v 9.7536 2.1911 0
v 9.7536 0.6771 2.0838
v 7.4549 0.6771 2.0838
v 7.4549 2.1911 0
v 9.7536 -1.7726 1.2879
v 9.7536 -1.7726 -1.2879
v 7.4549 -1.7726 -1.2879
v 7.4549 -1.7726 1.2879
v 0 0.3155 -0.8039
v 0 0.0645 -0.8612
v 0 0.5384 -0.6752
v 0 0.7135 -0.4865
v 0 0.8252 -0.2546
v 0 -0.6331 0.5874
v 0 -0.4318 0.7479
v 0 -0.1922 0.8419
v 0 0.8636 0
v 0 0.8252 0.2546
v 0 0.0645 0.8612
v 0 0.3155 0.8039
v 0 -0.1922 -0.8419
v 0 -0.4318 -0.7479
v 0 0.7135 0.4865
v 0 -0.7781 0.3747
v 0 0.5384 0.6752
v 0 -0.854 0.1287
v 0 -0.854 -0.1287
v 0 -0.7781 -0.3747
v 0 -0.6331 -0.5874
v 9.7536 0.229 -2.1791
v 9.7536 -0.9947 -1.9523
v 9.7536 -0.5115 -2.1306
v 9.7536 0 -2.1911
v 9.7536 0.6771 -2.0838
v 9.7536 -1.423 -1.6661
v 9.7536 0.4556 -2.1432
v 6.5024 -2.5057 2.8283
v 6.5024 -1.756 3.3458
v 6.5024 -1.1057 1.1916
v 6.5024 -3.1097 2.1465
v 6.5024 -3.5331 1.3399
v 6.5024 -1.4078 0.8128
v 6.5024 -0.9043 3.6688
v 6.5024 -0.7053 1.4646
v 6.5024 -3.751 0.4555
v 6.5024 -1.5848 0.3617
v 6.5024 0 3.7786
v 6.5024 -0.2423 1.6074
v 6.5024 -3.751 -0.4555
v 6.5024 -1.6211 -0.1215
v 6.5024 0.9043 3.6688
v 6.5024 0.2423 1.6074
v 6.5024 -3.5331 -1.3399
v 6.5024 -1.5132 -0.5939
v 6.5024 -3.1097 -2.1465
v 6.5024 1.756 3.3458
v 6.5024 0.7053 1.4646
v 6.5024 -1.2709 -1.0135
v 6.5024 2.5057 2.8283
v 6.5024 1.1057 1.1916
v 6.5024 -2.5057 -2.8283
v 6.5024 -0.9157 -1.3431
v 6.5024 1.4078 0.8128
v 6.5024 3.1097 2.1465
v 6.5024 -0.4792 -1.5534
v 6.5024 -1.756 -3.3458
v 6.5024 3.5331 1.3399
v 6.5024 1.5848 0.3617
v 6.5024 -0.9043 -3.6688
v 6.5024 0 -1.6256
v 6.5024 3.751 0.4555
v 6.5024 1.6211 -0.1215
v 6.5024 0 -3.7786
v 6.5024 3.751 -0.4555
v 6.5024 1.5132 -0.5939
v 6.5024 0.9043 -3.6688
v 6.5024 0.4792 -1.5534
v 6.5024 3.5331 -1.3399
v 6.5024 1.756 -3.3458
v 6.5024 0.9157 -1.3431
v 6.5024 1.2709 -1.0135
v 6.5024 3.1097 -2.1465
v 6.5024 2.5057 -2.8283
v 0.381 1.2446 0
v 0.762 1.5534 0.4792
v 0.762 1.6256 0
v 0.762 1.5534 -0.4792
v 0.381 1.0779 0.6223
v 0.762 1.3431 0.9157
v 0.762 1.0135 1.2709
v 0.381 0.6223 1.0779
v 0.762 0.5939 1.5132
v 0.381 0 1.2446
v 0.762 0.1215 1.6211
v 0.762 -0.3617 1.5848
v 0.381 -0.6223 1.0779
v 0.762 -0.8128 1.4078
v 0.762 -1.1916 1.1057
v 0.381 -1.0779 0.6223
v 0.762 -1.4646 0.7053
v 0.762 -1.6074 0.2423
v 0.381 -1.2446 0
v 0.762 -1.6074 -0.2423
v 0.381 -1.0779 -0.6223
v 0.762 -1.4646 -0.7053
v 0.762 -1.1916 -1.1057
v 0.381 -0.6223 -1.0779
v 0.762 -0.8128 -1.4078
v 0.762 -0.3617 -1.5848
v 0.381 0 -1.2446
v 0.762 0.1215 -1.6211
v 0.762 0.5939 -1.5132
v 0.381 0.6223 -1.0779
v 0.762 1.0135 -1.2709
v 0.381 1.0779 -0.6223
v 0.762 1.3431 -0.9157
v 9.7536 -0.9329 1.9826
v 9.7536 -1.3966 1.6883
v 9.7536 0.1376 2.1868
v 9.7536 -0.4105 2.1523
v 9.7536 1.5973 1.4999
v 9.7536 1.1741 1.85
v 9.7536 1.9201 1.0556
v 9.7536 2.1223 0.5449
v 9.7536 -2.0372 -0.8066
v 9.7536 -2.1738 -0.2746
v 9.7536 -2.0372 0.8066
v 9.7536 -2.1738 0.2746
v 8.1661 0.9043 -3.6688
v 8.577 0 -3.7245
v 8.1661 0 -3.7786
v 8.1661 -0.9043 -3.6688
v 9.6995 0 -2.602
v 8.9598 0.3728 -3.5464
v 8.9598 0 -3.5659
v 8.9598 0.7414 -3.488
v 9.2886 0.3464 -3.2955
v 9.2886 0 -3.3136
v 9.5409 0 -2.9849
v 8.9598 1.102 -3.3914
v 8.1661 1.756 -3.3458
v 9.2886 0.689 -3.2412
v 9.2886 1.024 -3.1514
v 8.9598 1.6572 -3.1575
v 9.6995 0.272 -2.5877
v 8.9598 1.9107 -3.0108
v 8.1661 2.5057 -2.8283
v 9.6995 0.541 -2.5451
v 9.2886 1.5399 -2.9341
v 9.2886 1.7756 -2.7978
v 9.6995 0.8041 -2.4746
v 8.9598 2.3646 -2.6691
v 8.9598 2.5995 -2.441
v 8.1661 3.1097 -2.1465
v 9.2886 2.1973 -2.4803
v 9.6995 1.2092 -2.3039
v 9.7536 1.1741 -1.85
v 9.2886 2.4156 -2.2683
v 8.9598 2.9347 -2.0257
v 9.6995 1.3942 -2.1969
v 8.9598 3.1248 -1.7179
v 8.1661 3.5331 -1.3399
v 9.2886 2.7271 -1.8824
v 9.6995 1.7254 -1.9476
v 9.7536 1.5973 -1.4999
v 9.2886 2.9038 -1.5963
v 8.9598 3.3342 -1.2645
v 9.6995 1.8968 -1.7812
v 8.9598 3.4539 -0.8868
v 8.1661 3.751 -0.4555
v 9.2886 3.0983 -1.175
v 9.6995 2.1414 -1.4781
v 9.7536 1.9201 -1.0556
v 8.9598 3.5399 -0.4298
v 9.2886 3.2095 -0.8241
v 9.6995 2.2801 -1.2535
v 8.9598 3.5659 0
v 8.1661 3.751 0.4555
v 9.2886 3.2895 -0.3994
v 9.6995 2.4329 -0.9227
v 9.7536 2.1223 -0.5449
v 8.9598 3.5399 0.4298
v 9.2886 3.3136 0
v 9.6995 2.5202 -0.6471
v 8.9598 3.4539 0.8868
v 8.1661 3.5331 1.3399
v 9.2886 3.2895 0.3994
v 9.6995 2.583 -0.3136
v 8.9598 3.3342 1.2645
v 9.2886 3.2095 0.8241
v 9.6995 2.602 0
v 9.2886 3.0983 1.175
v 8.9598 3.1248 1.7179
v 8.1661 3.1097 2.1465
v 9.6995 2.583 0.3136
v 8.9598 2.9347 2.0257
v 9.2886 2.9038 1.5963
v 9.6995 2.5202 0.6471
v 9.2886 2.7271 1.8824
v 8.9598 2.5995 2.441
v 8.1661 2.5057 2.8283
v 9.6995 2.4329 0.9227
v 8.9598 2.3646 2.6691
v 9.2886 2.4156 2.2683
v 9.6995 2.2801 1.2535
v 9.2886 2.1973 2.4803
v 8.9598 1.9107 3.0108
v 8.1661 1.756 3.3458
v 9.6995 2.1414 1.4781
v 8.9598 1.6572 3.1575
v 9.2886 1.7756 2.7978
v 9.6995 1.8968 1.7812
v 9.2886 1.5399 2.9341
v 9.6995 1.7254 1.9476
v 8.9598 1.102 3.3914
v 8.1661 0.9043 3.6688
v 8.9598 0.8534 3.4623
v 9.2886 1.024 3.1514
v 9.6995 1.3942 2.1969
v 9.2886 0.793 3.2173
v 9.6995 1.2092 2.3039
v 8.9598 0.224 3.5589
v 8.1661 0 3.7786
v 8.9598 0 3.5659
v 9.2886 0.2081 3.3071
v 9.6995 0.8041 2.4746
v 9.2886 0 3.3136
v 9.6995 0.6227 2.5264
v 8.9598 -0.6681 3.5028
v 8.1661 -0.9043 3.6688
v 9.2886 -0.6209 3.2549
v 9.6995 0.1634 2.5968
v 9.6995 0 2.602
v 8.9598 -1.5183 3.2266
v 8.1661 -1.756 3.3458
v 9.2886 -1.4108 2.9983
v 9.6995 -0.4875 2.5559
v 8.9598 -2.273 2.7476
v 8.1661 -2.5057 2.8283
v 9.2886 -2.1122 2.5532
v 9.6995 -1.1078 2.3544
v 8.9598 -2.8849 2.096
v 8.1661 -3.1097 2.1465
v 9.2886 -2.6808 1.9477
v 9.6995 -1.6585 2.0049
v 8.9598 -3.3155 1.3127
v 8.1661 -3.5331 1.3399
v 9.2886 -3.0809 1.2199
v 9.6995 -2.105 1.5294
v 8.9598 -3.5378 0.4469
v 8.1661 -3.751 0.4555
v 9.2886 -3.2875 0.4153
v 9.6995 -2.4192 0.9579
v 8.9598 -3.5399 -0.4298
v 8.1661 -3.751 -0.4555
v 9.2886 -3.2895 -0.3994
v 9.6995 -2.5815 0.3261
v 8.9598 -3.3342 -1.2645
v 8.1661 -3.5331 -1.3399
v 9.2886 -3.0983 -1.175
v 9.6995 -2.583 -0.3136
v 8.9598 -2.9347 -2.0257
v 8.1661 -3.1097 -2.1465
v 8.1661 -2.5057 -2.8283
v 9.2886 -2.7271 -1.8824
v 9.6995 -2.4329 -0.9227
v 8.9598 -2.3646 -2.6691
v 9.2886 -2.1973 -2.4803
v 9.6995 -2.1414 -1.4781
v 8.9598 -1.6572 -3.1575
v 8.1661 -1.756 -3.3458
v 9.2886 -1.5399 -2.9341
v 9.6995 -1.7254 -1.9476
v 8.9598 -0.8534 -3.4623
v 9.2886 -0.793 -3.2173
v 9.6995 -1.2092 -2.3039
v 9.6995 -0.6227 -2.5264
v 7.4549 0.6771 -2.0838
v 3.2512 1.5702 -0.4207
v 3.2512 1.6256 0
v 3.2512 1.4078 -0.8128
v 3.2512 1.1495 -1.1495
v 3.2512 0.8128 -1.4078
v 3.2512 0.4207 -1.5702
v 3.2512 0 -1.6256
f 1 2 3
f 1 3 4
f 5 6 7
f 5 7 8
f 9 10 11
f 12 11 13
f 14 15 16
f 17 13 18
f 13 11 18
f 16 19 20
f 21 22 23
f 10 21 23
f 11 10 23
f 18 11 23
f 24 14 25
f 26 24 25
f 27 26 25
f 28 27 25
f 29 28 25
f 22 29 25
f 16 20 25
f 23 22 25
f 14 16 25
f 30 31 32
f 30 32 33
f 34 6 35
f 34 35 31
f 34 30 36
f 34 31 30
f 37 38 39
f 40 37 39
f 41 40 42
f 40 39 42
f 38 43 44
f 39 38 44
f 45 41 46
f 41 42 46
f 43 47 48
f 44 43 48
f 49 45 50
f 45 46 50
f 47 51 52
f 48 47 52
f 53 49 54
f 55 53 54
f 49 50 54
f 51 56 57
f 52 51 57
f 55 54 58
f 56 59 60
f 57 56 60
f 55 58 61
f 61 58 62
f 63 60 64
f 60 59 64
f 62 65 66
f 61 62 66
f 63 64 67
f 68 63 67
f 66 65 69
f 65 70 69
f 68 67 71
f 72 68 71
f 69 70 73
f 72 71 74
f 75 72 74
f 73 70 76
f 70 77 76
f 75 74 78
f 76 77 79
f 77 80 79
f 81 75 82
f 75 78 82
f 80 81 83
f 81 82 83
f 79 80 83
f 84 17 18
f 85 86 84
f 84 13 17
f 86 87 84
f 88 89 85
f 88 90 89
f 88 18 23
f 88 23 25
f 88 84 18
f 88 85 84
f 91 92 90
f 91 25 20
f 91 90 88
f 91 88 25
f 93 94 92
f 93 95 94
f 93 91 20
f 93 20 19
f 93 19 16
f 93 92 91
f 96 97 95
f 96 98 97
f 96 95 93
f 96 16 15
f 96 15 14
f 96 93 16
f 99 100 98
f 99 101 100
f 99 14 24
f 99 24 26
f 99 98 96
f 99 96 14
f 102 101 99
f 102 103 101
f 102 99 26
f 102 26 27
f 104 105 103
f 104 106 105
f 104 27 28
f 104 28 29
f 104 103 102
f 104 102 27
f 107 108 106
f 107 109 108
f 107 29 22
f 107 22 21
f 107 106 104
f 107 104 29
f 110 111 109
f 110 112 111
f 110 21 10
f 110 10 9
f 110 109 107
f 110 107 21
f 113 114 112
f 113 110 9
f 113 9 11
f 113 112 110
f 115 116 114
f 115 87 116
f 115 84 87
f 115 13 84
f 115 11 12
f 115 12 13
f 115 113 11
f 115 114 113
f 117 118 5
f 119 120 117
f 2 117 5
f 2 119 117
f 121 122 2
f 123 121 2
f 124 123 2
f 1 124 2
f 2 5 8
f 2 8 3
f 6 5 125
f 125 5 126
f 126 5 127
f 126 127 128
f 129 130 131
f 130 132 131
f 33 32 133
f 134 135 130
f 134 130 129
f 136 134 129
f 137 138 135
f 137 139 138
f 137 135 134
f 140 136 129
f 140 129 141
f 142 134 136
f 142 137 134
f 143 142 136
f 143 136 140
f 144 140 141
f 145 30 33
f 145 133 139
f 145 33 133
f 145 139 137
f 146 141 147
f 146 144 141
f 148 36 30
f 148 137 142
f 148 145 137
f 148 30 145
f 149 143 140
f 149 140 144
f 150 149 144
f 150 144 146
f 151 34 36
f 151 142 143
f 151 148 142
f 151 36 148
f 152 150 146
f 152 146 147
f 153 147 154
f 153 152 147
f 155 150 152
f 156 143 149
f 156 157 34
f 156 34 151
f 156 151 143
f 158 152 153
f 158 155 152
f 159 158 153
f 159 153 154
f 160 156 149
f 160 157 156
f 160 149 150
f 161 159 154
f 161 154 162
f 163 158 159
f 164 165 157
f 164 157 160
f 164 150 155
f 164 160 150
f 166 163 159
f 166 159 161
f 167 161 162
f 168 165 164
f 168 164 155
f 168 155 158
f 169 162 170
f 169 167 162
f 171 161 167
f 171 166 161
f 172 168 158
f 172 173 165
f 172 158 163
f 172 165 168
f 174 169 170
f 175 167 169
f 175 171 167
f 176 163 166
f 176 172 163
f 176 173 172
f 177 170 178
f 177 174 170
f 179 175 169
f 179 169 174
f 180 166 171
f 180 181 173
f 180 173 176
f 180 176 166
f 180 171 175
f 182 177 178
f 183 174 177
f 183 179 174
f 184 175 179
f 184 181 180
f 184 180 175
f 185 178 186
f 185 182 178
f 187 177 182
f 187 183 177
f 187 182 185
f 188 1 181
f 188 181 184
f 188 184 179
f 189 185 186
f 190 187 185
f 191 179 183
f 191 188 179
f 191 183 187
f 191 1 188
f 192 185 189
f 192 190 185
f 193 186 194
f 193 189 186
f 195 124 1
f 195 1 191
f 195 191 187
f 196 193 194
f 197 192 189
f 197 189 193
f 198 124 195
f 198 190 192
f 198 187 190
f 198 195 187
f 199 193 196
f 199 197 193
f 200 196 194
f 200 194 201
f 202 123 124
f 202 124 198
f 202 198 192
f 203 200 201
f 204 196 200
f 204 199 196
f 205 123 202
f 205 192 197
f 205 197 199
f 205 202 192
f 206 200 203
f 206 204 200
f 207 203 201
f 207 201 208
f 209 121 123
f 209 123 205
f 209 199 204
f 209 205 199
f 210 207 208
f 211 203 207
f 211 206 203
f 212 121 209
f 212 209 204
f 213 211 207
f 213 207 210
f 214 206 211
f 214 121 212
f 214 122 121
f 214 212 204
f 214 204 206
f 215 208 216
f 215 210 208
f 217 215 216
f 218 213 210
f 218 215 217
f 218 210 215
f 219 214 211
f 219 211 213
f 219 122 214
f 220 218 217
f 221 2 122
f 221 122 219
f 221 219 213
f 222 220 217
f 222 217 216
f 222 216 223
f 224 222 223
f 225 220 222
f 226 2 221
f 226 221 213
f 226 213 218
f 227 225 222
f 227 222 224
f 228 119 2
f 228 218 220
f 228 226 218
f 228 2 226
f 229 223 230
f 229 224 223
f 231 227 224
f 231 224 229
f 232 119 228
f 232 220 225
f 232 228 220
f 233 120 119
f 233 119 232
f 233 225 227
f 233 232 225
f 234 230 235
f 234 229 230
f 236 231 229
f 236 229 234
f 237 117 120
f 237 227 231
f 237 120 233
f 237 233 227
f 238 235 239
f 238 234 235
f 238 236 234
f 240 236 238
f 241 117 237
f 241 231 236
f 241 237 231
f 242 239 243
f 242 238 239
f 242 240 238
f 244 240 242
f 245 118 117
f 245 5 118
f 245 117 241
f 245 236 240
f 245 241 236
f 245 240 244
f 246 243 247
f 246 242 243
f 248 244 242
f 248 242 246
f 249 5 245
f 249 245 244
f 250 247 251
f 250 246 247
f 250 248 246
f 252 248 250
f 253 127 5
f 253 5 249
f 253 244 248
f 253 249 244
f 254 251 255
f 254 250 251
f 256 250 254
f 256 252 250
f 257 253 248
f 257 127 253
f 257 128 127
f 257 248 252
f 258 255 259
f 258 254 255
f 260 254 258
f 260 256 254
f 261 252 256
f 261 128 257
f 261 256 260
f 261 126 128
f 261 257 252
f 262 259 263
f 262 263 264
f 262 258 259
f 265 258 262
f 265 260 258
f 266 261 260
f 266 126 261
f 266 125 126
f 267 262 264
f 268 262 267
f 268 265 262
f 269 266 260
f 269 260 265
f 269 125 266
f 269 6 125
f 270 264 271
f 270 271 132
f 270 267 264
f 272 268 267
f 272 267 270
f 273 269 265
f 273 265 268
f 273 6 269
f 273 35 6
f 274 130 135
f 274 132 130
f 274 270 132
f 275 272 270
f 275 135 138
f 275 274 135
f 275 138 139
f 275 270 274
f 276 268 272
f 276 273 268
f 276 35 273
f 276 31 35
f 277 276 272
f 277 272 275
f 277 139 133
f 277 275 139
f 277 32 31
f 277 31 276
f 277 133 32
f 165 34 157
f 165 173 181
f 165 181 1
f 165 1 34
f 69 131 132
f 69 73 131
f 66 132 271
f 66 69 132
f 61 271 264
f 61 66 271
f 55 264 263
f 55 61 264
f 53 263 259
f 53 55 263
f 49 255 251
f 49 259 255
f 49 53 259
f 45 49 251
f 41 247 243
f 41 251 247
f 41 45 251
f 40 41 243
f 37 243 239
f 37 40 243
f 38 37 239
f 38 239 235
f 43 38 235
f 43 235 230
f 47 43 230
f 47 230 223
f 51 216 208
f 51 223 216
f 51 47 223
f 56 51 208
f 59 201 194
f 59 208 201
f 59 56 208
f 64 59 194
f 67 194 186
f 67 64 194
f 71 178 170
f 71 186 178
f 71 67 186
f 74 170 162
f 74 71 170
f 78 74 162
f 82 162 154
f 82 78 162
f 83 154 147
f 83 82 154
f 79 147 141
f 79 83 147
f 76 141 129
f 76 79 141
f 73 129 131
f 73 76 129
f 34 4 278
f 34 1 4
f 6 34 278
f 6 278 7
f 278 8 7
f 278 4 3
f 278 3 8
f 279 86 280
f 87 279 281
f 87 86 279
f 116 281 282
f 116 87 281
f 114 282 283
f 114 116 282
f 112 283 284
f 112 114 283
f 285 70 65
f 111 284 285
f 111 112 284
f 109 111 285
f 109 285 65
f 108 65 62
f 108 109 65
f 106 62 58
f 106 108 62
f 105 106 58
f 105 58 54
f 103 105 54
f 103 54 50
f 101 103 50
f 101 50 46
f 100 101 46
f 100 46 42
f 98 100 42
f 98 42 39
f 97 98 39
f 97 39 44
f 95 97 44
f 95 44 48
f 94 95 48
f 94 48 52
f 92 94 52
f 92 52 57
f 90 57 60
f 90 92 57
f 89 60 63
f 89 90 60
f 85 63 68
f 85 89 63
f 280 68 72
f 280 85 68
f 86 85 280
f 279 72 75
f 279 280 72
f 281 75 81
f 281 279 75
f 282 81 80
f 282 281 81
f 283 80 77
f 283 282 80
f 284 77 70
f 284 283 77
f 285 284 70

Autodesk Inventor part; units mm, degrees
ref_plane "YZ Plane" through (0, 0, 0) normal (1, 0, 0) x (0, 1, 0)
ref_plane "XZ Plane" through (0, 0, 0) normal (0, 1, 0) x (-1, 0, 0)
ref_plane "XY Plane" through (0, 0, 0) normal (0, 0, 1) x (1, 0, 0)
sketch "Sketch1" plane through (0, 0, 0) normal (1, 0, 0) x (0, 1, 0)
  circle A0 centre (0, 0) radius 1.6256
  dimension "d0" = 3.2512
extrude "Extrusion1" add sketch "Sketch1" along normal blind 3.2512
thread "Thread1" size "6-32 UNC" class "2A" standard "ANSI Unified Screw Threads" full length
sketch "Sketch2" plane through (3.2512, 0, 0) normal (1, 0, 0) x (0, 0, -1)
  circle A0 centre (0, 0) radius 1.6256
extrude "Extrusion2" add sketch "Sketch2" along normal blind 3.2512
sketch "Sketch3" plane through (6.5024, 0, 0) normal (1, 0, 0) x (0, 0, -1)
  circle A0 centre (0, 0) radius 3.7786
extrude "Extrusion3" add sketch "Sketch3" along normal blind 3.2512
fillet "Fillet1" radius 1.5875 1 edges at (9.7536, 0, 3.7786)
sketch "Sketch4" plane through (9.7536, 0, 0) normal (1, 0, 0) x (0, 0, -1)
  circle A0 centre (0, 0) radius 2.1911 projected
  line L0 (0, 2.1911) -> (2.0838, 0.6771)
  line L1 (2.0838, 0.6771) -> (1.2879, -1.7726)
  line L2 (1.2879, -1.7726) -> (-1.2879, -1.7726)
  line L3 (-1.2879, -1.7726) -> (-2.0838, 0.6771)
  line L4 (-2.0838, 0.6771) -> (0, 2.1911)
extrude "Extrusion4" cut sketch "Sketch4" against normal blind 2.2987 contours L1 L2 L3 L4 L0
chamfer "Chamfer1" distance 0.762 angle 45 1 edges at (0, -1.6256, 0)
properties part number "hex nut"
